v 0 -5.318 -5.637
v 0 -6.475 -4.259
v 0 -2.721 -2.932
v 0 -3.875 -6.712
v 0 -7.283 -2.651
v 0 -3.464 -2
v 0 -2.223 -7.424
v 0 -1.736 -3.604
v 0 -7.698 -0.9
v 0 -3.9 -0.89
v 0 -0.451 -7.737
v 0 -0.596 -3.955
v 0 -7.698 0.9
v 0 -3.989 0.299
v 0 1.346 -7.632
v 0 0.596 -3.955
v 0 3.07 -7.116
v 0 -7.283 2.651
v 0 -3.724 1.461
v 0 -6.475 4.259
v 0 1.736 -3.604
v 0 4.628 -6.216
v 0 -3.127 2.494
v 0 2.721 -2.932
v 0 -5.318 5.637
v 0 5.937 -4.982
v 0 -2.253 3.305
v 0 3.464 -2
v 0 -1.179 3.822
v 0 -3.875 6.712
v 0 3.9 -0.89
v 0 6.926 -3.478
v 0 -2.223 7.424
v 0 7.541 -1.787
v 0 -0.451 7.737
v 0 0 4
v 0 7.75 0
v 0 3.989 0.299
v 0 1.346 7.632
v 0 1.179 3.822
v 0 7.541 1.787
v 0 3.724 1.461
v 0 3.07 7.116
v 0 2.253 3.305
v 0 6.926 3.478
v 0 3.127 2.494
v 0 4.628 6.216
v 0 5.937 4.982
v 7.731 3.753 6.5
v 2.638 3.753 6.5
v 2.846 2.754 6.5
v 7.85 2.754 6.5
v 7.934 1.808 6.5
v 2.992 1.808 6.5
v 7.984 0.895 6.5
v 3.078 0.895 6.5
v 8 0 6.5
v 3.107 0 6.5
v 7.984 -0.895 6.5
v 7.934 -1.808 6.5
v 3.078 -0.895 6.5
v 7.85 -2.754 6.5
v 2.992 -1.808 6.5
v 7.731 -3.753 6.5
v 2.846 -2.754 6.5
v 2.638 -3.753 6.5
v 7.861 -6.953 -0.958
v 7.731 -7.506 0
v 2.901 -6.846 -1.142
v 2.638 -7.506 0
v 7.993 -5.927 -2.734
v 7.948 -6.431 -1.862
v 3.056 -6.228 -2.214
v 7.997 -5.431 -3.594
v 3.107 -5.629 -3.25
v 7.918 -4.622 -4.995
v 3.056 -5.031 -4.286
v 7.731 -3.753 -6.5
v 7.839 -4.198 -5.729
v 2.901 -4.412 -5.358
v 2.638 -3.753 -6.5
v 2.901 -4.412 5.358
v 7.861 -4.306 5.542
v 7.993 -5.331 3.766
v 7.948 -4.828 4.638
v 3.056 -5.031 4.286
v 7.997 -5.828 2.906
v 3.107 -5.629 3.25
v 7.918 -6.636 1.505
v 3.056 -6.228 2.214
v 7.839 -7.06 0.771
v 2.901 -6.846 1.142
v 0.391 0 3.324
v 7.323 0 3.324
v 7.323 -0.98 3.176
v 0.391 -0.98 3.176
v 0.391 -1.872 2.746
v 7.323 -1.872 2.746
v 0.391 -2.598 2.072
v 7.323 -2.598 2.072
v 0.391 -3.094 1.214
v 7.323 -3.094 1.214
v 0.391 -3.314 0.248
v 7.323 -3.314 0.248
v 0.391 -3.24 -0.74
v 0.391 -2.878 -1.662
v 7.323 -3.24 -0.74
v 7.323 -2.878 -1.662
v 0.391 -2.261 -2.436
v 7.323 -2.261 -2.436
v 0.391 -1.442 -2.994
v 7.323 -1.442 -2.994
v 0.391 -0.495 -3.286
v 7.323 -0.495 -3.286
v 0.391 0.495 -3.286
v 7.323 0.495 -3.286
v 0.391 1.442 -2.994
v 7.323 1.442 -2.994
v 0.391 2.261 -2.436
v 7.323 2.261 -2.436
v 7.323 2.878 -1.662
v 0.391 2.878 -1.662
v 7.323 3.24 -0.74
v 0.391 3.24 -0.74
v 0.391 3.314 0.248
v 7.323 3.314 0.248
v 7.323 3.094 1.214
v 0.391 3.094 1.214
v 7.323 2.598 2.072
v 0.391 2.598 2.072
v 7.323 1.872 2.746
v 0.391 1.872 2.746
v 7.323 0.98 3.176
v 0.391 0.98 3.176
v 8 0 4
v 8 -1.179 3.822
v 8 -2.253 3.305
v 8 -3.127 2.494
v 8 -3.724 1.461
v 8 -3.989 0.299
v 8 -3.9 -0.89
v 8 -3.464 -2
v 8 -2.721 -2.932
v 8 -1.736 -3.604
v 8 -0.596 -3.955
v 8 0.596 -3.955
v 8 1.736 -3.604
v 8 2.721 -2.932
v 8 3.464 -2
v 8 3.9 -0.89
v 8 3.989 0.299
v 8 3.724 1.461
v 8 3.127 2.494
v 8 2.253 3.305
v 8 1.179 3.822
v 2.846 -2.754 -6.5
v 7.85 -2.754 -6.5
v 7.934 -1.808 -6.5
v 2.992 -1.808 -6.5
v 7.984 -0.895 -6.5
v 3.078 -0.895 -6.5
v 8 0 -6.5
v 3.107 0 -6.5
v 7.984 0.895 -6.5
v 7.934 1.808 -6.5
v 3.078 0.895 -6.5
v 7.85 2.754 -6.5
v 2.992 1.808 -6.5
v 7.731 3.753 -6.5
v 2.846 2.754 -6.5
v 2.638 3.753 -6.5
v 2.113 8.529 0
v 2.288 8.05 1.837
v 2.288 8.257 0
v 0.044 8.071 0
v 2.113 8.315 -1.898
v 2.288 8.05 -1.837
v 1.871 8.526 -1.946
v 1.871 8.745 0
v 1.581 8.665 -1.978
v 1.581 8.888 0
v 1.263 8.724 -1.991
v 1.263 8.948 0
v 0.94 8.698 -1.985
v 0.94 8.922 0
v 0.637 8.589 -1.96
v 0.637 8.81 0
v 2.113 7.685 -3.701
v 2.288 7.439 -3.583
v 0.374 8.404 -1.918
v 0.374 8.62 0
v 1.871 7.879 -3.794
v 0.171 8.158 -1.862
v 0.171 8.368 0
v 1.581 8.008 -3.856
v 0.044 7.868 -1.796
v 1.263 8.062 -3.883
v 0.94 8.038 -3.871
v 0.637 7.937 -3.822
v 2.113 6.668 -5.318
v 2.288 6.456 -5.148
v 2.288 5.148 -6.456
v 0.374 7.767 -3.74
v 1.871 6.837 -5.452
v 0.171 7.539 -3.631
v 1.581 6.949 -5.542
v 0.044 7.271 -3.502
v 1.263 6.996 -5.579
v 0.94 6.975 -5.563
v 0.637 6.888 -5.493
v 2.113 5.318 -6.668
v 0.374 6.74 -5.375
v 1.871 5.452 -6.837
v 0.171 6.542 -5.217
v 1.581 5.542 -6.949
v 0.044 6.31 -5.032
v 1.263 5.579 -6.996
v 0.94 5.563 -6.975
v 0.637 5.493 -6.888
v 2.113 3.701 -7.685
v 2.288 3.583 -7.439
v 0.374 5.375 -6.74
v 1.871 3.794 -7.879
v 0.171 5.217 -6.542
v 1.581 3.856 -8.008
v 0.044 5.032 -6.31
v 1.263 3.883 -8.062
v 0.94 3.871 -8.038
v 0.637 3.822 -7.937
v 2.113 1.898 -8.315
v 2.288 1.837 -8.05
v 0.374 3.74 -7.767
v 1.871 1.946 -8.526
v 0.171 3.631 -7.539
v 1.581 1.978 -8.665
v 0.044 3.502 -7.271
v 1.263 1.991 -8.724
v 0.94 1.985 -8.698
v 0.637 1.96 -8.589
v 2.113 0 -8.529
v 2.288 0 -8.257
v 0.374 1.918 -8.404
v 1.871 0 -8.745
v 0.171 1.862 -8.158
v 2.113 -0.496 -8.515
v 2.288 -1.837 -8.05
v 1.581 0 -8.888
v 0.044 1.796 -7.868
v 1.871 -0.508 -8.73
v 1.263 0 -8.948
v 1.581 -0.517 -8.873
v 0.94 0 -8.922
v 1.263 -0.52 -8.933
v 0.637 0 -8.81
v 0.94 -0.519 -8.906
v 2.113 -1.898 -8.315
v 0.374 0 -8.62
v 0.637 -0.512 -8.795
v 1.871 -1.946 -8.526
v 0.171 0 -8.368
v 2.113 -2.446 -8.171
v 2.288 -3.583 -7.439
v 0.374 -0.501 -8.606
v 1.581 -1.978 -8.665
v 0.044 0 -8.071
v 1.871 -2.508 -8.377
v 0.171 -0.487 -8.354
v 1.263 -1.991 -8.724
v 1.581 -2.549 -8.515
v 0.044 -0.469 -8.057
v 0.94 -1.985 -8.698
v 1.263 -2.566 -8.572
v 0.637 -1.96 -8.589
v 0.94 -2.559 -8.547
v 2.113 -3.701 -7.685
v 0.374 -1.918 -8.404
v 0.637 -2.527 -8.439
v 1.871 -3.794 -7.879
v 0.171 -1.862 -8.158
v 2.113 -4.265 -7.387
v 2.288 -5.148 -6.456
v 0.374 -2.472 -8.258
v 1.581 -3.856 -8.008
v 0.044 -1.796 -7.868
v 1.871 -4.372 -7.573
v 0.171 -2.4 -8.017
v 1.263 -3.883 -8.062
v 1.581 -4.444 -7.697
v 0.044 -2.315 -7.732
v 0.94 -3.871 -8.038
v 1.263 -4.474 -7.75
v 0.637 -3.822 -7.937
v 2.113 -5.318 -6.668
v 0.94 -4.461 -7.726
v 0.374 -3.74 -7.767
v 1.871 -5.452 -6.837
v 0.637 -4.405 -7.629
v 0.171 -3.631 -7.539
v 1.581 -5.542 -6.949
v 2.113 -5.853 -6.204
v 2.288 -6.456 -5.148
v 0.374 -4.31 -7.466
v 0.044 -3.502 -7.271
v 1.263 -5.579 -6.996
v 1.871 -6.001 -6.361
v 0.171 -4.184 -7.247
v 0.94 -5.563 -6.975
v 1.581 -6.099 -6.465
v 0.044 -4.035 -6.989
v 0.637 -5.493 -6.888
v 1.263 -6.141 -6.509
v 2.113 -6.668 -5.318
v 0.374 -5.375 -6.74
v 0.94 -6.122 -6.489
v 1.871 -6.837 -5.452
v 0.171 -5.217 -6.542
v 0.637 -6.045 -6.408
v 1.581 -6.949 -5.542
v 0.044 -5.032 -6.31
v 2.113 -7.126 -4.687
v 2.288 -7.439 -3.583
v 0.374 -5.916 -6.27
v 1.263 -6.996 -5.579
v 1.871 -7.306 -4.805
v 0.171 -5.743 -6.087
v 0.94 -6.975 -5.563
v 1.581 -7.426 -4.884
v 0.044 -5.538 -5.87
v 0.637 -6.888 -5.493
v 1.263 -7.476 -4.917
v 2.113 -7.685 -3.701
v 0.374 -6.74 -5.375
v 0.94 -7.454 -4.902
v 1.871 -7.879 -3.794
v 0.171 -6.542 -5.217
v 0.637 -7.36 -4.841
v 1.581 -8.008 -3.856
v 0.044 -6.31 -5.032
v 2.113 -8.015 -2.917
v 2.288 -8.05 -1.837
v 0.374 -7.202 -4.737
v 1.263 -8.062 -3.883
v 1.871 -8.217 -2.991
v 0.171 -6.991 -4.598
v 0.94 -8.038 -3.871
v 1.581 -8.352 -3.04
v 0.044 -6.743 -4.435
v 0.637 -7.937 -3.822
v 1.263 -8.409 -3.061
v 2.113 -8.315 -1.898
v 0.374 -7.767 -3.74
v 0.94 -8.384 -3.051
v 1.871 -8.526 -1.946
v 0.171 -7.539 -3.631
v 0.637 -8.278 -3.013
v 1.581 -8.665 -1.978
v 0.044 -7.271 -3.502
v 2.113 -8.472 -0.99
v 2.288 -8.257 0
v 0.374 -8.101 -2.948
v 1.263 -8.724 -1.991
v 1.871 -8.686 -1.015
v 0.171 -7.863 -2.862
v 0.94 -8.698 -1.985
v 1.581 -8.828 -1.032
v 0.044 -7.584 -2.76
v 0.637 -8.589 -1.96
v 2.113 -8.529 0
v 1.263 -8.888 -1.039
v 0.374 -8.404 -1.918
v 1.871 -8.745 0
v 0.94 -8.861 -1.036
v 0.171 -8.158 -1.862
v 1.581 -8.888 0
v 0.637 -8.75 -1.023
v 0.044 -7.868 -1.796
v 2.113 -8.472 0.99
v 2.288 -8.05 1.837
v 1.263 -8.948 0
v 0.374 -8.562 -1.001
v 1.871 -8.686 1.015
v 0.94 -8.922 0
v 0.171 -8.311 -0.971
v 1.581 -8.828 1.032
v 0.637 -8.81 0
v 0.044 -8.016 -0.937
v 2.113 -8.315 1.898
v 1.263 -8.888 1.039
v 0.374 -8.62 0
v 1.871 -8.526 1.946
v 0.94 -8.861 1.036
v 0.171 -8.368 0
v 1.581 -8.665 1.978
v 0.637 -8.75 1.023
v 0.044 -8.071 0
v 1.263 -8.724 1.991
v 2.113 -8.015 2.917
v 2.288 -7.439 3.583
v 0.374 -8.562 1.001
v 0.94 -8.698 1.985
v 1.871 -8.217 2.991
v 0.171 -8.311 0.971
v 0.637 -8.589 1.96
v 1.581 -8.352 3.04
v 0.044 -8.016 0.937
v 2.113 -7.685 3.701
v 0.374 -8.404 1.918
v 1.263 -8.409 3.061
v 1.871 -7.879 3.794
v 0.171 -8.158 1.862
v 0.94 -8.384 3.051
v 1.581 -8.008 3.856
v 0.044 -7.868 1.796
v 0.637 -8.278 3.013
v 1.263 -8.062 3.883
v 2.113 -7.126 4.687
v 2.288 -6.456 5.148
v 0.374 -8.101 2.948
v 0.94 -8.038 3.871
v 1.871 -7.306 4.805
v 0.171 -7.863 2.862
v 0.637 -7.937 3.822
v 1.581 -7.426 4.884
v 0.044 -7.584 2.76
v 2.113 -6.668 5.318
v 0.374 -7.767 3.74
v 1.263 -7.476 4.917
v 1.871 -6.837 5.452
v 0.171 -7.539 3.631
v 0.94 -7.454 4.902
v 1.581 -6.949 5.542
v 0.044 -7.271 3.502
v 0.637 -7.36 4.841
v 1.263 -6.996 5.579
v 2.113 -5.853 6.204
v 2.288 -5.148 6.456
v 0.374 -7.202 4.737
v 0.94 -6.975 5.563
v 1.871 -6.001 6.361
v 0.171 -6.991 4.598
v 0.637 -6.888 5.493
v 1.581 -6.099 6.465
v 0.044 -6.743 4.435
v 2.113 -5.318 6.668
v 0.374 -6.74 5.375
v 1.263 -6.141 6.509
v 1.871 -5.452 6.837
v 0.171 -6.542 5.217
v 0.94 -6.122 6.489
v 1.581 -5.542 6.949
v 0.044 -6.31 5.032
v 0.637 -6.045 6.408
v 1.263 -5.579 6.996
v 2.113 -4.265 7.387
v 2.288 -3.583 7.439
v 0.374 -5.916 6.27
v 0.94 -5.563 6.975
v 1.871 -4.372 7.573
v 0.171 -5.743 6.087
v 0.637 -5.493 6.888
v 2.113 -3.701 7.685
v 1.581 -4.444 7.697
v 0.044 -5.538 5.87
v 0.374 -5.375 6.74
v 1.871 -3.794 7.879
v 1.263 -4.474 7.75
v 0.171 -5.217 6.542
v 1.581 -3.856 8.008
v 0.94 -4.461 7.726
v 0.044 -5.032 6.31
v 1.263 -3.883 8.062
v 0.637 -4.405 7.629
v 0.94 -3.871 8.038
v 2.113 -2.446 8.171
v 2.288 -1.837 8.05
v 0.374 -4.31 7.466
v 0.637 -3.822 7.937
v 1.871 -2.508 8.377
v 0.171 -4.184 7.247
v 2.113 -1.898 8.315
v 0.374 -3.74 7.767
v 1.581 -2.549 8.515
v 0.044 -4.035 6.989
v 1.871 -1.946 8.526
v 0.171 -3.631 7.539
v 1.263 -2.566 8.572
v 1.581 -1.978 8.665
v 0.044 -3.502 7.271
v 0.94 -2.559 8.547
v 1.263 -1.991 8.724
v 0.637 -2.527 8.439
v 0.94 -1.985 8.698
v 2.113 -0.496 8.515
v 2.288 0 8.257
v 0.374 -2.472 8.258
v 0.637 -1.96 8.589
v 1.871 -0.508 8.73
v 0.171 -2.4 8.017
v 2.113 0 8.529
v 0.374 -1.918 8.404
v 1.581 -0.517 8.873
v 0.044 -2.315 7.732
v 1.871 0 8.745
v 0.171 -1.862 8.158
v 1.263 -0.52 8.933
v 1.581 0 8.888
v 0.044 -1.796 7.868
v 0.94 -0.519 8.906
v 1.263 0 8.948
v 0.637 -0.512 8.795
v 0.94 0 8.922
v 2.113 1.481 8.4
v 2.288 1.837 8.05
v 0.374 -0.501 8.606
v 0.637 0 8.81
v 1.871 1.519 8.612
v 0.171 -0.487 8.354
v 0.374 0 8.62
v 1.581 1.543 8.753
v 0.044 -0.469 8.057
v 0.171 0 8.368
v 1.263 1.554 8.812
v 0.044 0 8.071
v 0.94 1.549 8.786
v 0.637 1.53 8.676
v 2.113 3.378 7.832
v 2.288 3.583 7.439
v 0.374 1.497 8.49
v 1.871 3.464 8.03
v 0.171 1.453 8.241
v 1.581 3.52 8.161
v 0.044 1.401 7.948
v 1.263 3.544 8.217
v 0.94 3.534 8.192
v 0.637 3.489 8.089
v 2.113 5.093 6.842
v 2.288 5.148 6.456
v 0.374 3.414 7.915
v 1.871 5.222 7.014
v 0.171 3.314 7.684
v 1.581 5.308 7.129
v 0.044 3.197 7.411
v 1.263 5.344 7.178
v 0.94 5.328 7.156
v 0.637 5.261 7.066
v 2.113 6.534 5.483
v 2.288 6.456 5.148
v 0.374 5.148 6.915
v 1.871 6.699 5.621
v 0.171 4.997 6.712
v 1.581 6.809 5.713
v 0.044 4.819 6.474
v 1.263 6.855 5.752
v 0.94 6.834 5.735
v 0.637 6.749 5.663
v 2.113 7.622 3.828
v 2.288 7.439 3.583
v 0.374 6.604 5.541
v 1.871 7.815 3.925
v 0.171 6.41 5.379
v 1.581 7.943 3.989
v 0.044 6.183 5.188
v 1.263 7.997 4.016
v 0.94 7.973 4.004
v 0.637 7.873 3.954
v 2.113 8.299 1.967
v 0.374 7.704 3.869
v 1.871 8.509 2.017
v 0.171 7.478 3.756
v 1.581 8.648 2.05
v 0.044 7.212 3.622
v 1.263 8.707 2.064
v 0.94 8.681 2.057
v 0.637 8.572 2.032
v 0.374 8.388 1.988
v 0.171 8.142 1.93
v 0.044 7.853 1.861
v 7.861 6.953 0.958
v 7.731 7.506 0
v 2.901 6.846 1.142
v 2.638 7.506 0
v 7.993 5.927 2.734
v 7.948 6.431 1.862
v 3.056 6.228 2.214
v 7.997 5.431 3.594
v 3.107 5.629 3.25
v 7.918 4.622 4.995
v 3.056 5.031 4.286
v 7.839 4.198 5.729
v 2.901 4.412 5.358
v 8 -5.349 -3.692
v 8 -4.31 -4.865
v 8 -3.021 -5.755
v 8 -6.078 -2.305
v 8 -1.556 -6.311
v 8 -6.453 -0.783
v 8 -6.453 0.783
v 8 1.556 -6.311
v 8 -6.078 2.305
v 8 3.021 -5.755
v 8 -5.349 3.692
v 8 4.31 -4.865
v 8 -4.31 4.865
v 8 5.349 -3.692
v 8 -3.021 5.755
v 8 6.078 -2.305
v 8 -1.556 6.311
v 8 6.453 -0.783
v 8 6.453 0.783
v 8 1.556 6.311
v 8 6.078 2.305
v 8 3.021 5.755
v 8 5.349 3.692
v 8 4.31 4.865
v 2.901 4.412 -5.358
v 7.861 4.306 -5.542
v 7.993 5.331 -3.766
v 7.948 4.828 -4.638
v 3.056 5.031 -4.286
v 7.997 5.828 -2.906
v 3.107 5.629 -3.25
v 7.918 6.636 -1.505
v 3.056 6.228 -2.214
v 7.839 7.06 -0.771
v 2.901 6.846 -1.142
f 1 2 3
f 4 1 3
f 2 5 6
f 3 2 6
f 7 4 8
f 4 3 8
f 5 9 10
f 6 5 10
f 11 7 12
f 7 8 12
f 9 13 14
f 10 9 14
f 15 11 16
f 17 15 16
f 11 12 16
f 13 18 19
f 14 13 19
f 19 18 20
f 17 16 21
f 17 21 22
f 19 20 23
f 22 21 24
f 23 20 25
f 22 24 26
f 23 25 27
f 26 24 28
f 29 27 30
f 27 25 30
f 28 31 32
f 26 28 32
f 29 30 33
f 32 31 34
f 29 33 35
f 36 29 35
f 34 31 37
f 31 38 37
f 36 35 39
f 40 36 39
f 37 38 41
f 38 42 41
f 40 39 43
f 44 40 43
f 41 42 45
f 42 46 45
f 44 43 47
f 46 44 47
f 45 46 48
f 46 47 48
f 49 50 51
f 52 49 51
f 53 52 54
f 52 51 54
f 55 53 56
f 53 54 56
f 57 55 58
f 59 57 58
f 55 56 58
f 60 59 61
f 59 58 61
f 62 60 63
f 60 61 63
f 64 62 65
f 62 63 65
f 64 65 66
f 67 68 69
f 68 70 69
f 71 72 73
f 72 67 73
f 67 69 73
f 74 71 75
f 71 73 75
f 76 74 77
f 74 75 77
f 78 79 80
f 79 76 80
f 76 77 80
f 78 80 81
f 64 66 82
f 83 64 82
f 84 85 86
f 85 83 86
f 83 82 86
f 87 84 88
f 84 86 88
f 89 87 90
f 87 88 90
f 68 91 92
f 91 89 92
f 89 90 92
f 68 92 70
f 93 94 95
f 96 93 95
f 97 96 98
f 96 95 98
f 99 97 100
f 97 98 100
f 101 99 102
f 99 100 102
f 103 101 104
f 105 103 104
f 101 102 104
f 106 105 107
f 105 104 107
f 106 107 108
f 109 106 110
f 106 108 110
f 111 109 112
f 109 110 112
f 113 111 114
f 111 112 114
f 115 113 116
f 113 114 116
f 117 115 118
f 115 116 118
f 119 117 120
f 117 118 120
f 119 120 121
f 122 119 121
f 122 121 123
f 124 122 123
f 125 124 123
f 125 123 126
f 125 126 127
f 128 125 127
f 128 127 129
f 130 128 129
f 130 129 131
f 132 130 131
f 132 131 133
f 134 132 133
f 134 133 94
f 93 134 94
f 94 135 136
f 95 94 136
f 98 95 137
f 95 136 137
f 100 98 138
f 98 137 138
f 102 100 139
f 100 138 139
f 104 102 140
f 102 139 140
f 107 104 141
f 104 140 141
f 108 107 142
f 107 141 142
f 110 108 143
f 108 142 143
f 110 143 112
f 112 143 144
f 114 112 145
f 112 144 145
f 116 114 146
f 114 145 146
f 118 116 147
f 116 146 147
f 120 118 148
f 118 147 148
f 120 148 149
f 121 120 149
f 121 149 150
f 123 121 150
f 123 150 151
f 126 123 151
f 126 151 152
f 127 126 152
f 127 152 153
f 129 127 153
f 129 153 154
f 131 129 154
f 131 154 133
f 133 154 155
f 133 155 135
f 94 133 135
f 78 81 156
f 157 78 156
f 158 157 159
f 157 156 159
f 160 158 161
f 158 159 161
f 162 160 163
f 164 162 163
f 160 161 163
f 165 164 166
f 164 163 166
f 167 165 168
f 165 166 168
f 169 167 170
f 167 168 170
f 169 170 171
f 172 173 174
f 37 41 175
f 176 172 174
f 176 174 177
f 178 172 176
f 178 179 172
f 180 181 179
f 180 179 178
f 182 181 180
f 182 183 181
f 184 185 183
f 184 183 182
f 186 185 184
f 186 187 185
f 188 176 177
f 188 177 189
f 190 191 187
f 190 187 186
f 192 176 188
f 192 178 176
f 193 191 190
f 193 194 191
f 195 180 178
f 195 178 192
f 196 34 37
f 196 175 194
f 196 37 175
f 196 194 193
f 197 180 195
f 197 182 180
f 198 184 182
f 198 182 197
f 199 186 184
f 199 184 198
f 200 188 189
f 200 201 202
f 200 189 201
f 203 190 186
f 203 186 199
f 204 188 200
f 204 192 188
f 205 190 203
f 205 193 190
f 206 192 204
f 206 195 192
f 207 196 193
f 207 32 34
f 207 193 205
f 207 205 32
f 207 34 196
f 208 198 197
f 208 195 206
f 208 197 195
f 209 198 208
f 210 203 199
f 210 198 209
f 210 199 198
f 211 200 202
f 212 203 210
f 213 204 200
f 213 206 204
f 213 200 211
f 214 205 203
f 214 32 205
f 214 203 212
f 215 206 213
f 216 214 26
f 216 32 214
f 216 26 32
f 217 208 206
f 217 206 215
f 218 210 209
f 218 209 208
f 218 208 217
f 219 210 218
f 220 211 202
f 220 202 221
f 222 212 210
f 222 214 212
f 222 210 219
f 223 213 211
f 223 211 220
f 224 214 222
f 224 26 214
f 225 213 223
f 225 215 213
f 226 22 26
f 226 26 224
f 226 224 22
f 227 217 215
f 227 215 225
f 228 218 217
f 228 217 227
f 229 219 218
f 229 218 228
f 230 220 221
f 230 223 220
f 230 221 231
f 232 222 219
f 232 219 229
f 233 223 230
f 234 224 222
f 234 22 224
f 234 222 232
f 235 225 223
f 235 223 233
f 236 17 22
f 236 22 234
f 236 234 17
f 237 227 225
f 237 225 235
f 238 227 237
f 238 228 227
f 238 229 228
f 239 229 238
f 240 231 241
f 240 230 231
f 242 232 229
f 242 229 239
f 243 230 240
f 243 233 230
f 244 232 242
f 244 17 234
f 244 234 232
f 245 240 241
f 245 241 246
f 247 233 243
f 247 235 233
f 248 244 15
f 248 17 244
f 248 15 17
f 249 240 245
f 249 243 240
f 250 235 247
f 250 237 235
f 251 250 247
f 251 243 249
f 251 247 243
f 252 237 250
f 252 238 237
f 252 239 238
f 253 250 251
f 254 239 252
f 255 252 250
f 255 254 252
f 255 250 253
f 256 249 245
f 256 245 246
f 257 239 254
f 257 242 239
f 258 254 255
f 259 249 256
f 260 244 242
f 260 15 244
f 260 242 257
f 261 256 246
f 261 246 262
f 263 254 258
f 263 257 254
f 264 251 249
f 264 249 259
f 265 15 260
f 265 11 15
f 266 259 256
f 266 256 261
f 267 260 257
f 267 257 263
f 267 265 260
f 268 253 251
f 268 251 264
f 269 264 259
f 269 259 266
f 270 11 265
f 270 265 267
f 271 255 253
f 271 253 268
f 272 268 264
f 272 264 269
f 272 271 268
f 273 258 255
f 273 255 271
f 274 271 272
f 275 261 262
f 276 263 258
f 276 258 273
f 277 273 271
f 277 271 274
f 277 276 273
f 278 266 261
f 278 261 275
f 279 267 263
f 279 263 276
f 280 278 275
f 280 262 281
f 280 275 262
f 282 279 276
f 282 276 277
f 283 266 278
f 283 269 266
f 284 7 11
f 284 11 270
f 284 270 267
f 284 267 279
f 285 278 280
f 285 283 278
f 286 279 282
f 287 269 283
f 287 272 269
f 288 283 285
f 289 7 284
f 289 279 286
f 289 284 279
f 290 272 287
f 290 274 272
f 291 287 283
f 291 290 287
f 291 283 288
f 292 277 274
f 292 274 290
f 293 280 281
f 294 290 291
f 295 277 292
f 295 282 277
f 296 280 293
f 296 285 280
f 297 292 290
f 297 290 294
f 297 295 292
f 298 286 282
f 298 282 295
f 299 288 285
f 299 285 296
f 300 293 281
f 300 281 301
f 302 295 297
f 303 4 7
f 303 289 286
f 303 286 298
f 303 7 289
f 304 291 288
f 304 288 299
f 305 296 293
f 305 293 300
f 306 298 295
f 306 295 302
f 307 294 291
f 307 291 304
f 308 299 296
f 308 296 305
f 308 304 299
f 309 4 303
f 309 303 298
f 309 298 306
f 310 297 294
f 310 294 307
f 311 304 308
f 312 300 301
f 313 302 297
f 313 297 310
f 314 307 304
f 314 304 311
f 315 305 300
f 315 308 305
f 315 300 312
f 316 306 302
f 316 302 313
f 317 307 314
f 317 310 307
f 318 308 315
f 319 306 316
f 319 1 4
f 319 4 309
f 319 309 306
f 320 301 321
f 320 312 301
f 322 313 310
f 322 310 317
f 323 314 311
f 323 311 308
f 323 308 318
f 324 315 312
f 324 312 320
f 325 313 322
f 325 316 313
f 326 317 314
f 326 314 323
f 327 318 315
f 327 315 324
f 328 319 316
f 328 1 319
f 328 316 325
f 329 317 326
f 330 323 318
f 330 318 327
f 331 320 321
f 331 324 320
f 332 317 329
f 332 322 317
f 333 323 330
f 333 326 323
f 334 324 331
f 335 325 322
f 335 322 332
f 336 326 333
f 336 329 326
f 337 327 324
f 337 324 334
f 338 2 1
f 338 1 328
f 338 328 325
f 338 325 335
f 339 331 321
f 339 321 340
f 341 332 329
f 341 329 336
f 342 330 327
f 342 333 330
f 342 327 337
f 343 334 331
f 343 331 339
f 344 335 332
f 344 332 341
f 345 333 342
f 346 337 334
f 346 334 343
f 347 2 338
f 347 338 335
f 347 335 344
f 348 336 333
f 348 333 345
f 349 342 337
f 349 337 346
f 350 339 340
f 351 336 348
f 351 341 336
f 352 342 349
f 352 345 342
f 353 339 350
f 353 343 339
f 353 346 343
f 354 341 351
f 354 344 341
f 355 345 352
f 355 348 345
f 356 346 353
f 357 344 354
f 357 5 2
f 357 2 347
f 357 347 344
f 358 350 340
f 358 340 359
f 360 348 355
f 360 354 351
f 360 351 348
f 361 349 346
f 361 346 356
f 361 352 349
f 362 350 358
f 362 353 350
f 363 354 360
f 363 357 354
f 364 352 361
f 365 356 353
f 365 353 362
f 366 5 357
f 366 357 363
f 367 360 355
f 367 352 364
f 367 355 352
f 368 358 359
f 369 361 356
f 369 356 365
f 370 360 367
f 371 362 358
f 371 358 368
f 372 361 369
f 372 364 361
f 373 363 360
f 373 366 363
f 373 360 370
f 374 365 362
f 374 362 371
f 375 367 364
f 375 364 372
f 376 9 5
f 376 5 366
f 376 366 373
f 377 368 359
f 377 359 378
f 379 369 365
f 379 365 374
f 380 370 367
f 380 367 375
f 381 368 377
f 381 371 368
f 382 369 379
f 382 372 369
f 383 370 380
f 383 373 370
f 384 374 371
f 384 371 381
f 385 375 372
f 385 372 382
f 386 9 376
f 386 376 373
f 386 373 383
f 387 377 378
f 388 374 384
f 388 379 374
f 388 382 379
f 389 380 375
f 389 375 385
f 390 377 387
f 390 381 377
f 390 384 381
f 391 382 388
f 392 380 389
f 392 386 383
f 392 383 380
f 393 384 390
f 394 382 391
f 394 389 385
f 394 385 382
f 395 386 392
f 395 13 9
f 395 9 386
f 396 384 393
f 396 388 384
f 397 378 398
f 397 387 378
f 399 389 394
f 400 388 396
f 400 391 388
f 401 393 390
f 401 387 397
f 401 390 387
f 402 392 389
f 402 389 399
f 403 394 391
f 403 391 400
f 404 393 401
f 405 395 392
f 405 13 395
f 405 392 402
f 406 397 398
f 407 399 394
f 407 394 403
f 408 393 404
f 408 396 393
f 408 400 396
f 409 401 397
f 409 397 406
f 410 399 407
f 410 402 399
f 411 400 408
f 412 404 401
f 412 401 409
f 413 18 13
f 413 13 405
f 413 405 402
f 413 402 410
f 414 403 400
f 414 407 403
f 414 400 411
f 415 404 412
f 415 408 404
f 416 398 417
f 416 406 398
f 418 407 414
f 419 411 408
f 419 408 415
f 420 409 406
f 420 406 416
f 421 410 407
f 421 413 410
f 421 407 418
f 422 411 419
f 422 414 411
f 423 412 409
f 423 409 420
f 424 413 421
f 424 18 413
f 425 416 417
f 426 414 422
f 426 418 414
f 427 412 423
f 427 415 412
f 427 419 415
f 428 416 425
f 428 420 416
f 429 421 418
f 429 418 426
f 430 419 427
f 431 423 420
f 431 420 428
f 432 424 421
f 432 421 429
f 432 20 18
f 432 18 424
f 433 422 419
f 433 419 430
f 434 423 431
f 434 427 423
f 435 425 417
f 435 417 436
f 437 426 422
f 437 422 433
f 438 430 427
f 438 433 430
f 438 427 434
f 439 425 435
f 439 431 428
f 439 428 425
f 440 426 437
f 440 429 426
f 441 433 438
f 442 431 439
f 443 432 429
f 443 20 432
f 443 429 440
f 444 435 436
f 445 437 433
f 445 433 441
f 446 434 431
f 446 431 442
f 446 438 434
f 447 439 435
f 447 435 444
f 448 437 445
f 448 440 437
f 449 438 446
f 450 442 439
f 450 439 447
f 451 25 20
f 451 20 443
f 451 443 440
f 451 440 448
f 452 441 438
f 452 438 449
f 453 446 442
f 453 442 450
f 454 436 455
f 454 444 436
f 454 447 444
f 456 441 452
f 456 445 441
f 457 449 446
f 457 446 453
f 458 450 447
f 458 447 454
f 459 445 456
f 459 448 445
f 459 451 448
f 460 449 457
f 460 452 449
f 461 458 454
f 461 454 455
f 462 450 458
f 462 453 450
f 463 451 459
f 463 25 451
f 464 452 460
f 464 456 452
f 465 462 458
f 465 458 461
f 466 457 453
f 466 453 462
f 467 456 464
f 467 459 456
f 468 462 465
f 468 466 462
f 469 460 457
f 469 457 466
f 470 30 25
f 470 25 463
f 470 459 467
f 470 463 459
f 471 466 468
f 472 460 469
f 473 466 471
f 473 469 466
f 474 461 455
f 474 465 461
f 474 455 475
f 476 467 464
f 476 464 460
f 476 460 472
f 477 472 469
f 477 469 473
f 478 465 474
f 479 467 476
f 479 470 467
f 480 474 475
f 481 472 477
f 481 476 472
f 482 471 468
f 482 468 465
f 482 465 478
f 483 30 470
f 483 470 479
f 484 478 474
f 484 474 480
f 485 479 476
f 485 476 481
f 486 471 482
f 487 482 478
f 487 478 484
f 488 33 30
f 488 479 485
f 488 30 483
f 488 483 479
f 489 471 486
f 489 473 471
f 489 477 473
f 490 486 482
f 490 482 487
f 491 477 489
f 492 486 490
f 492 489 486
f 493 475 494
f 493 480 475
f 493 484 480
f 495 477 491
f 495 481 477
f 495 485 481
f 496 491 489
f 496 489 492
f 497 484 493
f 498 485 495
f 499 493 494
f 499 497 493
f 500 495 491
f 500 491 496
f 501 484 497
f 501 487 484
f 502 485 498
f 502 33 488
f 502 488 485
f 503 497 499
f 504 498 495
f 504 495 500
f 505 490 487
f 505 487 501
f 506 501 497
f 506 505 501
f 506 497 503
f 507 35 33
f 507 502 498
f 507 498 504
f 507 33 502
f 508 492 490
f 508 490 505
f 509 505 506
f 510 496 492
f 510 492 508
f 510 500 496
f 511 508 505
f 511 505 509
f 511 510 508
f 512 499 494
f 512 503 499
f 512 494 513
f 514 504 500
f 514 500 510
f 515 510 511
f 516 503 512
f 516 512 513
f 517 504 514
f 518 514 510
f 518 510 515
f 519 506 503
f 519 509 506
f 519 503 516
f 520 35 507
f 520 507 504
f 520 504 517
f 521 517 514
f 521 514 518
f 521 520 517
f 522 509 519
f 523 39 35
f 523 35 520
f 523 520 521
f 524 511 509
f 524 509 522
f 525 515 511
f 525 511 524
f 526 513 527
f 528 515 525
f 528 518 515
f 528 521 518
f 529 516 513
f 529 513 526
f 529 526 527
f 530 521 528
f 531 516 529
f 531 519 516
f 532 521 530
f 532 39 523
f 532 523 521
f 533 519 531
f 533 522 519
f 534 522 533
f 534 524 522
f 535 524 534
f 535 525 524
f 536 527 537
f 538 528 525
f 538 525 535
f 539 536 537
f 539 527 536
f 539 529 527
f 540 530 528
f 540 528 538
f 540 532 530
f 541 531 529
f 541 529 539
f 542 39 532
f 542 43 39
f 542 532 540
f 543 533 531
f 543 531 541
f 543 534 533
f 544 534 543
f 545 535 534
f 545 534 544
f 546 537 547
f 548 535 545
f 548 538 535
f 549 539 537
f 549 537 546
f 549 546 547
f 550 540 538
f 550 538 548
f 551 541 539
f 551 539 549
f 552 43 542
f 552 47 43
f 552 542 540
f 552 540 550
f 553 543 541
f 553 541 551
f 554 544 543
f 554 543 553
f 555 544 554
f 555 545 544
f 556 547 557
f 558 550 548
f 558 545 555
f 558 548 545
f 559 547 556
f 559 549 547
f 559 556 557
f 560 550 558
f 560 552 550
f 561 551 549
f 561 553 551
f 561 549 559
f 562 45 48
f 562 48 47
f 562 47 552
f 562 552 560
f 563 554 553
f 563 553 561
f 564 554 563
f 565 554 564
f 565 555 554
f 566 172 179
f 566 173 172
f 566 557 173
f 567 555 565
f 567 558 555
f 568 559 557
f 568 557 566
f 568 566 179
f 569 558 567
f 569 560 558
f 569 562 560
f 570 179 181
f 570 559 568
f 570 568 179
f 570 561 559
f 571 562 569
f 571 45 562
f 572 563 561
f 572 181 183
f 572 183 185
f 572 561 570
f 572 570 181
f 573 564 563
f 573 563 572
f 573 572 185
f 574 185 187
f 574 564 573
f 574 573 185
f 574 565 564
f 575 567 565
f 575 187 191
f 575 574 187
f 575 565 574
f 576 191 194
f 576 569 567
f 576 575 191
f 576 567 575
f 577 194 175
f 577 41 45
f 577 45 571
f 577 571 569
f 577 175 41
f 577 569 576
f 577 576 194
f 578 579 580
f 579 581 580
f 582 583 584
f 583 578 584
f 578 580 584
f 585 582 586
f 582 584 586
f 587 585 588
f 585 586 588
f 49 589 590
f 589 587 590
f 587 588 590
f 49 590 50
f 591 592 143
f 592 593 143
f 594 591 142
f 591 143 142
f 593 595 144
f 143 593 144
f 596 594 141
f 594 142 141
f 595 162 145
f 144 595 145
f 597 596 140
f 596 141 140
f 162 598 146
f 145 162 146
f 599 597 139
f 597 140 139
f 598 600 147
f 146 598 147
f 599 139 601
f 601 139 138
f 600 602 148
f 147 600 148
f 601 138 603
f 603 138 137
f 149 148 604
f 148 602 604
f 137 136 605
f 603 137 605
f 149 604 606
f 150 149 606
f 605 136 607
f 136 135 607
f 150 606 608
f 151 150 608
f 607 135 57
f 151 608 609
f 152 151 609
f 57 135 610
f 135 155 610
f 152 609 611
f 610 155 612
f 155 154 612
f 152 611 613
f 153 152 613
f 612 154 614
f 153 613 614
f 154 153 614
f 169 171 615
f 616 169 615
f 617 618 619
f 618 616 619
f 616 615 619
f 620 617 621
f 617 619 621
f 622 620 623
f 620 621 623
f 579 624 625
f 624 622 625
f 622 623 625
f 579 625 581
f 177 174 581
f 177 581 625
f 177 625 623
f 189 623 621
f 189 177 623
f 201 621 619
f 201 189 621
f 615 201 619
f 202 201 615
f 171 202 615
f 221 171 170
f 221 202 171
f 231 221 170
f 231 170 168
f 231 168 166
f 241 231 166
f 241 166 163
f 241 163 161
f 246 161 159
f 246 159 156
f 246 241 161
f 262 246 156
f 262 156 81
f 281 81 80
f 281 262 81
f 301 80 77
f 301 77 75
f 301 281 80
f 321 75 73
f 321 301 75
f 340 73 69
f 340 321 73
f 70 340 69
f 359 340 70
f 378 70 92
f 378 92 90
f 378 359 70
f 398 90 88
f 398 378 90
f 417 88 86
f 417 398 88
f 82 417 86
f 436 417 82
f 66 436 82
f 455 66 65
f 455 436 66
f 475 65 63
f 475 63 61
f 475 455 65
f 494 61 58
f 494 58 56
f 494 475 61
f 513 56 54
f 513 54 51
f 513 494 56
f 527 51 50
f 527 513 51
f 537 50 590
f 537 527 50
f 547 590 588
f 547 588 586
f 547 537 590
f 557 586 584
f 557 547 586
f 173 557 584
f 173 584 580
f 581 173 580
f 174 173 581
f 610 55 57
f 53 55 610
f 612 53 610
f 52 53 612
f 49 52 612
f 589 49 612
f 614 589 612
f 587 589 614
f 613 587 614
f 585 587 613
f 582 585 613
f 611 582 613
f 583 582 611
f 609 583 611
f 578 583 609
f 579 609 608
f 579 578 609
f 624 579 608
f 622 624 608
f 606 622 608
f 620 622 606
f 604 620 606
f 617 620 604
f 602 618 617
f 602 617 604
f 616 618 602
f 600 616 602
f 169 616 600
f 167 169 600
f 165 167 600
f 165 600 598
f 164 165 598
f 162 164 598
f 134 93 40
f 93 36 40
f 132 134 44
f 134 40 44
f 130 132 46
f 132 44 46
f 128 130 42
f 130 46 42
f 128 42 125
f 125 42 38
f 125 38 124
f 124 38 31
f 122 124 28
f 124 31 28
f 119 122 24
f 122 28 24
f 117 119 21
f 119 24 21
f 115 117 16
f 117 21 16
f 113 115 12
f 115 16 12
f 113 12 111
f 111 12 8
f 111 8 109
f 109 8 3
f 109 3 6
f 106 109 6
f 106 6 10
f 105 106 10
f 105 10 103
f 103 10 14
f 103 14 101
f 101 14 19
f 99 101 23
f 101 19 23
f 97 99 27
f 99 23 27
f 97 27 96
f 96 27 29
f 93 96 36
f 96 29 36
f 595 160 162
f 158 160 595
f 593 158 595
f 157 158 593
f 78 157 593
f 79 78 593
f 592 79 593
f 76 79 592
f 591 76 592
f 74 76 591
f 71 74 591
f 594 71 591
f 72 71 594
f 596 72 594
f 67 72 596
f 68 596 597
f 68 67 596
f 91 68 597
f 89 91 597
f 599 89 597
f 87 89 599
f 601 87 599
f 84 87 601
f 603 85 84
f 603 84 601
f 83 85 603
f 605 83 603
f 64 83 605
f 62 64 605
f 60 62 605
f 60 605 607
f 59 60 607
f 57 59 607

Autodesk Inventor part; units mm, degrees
ref_plane "YZ Plane" through (0, 0, 0) normal (1, 0, 0) x (0, 1, 0)
ref_plane "XZ Plane" through (0, 0, 0) normal (0, 1, 0) x (-1, 0, 0)
sketch "Sketch1" plane through (0, 0, 0) normal (0, 0, 1) x (1, 0, 0)
  line L0 (-1.8442, 0) -> (9.6407, 0) projected
  line L1 (3.1069, 6.5) -> (2.2876, 8.2571)
  line L2 (3.1069, 6.5) -> (8, 6.5) construction
  line L3 (8, 6.5) -> (8, 0) construction
  arc A0 (2.2876, 8.2571) -> (0, 7.75) centre (1.2, 7.75) ccw
  line L4 (3.1069, 6.5) -> (3.1069, 0)
  line L5 (0, -1.835) -> (0, 11.0102) projected
  point P0 (0, 0)
  dimension "d2" = 13
  dimension "d4" = 17.9
  dimension "d5" = 1.2
  dimension "d15" = 8
  dimension "d16" = 25
revolve "Ring" add sketch "Sketch1" angle 360 about axis through (-10, 0, 0) along (1, 0, 0)
sketch "Sketch2" plane through (0, 0, 0) normal (-1, 0, 0) x (0, 0, 1)
  circle A0 centre (0, 0) radius 4.9
  line L0 (-6.5, -3.7528) -> (-6.5, 3.7528)
  line L1 (-6.5, 3.7528) -> (0, 7.5056)
  line L2 (0, 7.5056) -> (6.5, 3.7528)
  line L3 (6.5, 3.7528) -> (6.5, -3.7528)
  line L4 (6.5, -3.7528) -> (0, -7.5056)
  line L5 (0, -7.5056) -> (-6.5, -3.7528)
  circle A1 centre (0, 0) radius 7.75 projected
  dimension "d6" = 15.0111
extrude "Body" add sketch "Sketch2" against normal blind 8 contours A0 | L0 L1 L2 L3 L4 L5
sketch "Sketch3" plane through (0, 0, 0) normal (0, 0, 1) x (1, 0, 0)
  line L0 (2.638, 7.5056) -> (8, 7.5056) projected
  line L1 (8, 3.7528) -> (8, 7.5056) projected
  line L2 (0, -7.75) -> (0, 7.75) projected
  line L3 (-1.6, 0) -> (9.6, 0) projected
  line L4 (7.7306, 7.5056) -> (8, 6.5)
  dimension "d10" = 15
  dimension "d11" = 13
revolve "Chamfer1" cut sketch "Sketch3" angle 360 about axis through (-10, 0, 0) along (1, 0, 0)
sketch "Sketch4" plane through (0, 0, 0) normal (-1, 0, 0) x (0, 0, 1)
  circle A0 centre (0, 0) radius 7.75 projected
hole "Thread" at (0, 0, 0) direction (1, 0, 0) diameter 6.647 end through all thread size "M8x1.25" class "6H" standard "ISO Metric profile"
chamfer "Chamfer2" distance 0.6766 angle 30 1 edges at (0, 0, -3.3235) measured on face at (0, 6.1914, -0.7518)
ref_plane "Work Plane1" through (26.5484, 0, 0) normal (0, 0, -1) x (-1, 0, 0)
chamfer "Chamfer3" distance 0.6766 angle 45 1 edges at (8, 0, -3.3235)
equation "\"d2\" = SW"
equation "\"d4\" = LADI"
equation "\"d5\" = PHH"
equation "\"d15\" = KOH"
equation "\"d16\" = KEWI"
equation "\"d6\" = 1.1547 * SW"
equation "\"d7\" = KOH"
equation "\"d10\" = ANG1"
equation "\"d11\" = SW0"
equation "\"d12\" = -0.5 * GD1 + 0.5 * NND"
equation "\"d46\" = -0.5 * GD1 + 0.5 * NND"
equation "\"d51\" = -0.5 * GD1 + 0.5 * NND"
equation "\"ANG1\" = 15deg"
equation "\"KEWI\" = 25deg"
equation "\"NND\" = 8"
equation "\"LADI\" = 17.9"
equation "\"SW\" = 13"
equation "\"PHH\" = RR"
equation "\"KOH\" = NND"
equation "\"SW0\" = SW"
equation "\"d1\" = LADI"
equation "\"d3\" = PHH"
equation "\"GUL\" = 0.541266 * PTC"
equation "\"RR\" = 1.2"
equation "\"THREADDIA\" = 8"
equation "\"TOA\" = 30deg"
equation "\"PTC\" = 1.25"
equation "\"GAL\" = 0.541266 * PTC"
equation "\"E0\" = 1.155 * SW"
equation "\"GD1\" = 6.646835"
properties part number "DIN 6923 - M8" material "Steel, Mild"
